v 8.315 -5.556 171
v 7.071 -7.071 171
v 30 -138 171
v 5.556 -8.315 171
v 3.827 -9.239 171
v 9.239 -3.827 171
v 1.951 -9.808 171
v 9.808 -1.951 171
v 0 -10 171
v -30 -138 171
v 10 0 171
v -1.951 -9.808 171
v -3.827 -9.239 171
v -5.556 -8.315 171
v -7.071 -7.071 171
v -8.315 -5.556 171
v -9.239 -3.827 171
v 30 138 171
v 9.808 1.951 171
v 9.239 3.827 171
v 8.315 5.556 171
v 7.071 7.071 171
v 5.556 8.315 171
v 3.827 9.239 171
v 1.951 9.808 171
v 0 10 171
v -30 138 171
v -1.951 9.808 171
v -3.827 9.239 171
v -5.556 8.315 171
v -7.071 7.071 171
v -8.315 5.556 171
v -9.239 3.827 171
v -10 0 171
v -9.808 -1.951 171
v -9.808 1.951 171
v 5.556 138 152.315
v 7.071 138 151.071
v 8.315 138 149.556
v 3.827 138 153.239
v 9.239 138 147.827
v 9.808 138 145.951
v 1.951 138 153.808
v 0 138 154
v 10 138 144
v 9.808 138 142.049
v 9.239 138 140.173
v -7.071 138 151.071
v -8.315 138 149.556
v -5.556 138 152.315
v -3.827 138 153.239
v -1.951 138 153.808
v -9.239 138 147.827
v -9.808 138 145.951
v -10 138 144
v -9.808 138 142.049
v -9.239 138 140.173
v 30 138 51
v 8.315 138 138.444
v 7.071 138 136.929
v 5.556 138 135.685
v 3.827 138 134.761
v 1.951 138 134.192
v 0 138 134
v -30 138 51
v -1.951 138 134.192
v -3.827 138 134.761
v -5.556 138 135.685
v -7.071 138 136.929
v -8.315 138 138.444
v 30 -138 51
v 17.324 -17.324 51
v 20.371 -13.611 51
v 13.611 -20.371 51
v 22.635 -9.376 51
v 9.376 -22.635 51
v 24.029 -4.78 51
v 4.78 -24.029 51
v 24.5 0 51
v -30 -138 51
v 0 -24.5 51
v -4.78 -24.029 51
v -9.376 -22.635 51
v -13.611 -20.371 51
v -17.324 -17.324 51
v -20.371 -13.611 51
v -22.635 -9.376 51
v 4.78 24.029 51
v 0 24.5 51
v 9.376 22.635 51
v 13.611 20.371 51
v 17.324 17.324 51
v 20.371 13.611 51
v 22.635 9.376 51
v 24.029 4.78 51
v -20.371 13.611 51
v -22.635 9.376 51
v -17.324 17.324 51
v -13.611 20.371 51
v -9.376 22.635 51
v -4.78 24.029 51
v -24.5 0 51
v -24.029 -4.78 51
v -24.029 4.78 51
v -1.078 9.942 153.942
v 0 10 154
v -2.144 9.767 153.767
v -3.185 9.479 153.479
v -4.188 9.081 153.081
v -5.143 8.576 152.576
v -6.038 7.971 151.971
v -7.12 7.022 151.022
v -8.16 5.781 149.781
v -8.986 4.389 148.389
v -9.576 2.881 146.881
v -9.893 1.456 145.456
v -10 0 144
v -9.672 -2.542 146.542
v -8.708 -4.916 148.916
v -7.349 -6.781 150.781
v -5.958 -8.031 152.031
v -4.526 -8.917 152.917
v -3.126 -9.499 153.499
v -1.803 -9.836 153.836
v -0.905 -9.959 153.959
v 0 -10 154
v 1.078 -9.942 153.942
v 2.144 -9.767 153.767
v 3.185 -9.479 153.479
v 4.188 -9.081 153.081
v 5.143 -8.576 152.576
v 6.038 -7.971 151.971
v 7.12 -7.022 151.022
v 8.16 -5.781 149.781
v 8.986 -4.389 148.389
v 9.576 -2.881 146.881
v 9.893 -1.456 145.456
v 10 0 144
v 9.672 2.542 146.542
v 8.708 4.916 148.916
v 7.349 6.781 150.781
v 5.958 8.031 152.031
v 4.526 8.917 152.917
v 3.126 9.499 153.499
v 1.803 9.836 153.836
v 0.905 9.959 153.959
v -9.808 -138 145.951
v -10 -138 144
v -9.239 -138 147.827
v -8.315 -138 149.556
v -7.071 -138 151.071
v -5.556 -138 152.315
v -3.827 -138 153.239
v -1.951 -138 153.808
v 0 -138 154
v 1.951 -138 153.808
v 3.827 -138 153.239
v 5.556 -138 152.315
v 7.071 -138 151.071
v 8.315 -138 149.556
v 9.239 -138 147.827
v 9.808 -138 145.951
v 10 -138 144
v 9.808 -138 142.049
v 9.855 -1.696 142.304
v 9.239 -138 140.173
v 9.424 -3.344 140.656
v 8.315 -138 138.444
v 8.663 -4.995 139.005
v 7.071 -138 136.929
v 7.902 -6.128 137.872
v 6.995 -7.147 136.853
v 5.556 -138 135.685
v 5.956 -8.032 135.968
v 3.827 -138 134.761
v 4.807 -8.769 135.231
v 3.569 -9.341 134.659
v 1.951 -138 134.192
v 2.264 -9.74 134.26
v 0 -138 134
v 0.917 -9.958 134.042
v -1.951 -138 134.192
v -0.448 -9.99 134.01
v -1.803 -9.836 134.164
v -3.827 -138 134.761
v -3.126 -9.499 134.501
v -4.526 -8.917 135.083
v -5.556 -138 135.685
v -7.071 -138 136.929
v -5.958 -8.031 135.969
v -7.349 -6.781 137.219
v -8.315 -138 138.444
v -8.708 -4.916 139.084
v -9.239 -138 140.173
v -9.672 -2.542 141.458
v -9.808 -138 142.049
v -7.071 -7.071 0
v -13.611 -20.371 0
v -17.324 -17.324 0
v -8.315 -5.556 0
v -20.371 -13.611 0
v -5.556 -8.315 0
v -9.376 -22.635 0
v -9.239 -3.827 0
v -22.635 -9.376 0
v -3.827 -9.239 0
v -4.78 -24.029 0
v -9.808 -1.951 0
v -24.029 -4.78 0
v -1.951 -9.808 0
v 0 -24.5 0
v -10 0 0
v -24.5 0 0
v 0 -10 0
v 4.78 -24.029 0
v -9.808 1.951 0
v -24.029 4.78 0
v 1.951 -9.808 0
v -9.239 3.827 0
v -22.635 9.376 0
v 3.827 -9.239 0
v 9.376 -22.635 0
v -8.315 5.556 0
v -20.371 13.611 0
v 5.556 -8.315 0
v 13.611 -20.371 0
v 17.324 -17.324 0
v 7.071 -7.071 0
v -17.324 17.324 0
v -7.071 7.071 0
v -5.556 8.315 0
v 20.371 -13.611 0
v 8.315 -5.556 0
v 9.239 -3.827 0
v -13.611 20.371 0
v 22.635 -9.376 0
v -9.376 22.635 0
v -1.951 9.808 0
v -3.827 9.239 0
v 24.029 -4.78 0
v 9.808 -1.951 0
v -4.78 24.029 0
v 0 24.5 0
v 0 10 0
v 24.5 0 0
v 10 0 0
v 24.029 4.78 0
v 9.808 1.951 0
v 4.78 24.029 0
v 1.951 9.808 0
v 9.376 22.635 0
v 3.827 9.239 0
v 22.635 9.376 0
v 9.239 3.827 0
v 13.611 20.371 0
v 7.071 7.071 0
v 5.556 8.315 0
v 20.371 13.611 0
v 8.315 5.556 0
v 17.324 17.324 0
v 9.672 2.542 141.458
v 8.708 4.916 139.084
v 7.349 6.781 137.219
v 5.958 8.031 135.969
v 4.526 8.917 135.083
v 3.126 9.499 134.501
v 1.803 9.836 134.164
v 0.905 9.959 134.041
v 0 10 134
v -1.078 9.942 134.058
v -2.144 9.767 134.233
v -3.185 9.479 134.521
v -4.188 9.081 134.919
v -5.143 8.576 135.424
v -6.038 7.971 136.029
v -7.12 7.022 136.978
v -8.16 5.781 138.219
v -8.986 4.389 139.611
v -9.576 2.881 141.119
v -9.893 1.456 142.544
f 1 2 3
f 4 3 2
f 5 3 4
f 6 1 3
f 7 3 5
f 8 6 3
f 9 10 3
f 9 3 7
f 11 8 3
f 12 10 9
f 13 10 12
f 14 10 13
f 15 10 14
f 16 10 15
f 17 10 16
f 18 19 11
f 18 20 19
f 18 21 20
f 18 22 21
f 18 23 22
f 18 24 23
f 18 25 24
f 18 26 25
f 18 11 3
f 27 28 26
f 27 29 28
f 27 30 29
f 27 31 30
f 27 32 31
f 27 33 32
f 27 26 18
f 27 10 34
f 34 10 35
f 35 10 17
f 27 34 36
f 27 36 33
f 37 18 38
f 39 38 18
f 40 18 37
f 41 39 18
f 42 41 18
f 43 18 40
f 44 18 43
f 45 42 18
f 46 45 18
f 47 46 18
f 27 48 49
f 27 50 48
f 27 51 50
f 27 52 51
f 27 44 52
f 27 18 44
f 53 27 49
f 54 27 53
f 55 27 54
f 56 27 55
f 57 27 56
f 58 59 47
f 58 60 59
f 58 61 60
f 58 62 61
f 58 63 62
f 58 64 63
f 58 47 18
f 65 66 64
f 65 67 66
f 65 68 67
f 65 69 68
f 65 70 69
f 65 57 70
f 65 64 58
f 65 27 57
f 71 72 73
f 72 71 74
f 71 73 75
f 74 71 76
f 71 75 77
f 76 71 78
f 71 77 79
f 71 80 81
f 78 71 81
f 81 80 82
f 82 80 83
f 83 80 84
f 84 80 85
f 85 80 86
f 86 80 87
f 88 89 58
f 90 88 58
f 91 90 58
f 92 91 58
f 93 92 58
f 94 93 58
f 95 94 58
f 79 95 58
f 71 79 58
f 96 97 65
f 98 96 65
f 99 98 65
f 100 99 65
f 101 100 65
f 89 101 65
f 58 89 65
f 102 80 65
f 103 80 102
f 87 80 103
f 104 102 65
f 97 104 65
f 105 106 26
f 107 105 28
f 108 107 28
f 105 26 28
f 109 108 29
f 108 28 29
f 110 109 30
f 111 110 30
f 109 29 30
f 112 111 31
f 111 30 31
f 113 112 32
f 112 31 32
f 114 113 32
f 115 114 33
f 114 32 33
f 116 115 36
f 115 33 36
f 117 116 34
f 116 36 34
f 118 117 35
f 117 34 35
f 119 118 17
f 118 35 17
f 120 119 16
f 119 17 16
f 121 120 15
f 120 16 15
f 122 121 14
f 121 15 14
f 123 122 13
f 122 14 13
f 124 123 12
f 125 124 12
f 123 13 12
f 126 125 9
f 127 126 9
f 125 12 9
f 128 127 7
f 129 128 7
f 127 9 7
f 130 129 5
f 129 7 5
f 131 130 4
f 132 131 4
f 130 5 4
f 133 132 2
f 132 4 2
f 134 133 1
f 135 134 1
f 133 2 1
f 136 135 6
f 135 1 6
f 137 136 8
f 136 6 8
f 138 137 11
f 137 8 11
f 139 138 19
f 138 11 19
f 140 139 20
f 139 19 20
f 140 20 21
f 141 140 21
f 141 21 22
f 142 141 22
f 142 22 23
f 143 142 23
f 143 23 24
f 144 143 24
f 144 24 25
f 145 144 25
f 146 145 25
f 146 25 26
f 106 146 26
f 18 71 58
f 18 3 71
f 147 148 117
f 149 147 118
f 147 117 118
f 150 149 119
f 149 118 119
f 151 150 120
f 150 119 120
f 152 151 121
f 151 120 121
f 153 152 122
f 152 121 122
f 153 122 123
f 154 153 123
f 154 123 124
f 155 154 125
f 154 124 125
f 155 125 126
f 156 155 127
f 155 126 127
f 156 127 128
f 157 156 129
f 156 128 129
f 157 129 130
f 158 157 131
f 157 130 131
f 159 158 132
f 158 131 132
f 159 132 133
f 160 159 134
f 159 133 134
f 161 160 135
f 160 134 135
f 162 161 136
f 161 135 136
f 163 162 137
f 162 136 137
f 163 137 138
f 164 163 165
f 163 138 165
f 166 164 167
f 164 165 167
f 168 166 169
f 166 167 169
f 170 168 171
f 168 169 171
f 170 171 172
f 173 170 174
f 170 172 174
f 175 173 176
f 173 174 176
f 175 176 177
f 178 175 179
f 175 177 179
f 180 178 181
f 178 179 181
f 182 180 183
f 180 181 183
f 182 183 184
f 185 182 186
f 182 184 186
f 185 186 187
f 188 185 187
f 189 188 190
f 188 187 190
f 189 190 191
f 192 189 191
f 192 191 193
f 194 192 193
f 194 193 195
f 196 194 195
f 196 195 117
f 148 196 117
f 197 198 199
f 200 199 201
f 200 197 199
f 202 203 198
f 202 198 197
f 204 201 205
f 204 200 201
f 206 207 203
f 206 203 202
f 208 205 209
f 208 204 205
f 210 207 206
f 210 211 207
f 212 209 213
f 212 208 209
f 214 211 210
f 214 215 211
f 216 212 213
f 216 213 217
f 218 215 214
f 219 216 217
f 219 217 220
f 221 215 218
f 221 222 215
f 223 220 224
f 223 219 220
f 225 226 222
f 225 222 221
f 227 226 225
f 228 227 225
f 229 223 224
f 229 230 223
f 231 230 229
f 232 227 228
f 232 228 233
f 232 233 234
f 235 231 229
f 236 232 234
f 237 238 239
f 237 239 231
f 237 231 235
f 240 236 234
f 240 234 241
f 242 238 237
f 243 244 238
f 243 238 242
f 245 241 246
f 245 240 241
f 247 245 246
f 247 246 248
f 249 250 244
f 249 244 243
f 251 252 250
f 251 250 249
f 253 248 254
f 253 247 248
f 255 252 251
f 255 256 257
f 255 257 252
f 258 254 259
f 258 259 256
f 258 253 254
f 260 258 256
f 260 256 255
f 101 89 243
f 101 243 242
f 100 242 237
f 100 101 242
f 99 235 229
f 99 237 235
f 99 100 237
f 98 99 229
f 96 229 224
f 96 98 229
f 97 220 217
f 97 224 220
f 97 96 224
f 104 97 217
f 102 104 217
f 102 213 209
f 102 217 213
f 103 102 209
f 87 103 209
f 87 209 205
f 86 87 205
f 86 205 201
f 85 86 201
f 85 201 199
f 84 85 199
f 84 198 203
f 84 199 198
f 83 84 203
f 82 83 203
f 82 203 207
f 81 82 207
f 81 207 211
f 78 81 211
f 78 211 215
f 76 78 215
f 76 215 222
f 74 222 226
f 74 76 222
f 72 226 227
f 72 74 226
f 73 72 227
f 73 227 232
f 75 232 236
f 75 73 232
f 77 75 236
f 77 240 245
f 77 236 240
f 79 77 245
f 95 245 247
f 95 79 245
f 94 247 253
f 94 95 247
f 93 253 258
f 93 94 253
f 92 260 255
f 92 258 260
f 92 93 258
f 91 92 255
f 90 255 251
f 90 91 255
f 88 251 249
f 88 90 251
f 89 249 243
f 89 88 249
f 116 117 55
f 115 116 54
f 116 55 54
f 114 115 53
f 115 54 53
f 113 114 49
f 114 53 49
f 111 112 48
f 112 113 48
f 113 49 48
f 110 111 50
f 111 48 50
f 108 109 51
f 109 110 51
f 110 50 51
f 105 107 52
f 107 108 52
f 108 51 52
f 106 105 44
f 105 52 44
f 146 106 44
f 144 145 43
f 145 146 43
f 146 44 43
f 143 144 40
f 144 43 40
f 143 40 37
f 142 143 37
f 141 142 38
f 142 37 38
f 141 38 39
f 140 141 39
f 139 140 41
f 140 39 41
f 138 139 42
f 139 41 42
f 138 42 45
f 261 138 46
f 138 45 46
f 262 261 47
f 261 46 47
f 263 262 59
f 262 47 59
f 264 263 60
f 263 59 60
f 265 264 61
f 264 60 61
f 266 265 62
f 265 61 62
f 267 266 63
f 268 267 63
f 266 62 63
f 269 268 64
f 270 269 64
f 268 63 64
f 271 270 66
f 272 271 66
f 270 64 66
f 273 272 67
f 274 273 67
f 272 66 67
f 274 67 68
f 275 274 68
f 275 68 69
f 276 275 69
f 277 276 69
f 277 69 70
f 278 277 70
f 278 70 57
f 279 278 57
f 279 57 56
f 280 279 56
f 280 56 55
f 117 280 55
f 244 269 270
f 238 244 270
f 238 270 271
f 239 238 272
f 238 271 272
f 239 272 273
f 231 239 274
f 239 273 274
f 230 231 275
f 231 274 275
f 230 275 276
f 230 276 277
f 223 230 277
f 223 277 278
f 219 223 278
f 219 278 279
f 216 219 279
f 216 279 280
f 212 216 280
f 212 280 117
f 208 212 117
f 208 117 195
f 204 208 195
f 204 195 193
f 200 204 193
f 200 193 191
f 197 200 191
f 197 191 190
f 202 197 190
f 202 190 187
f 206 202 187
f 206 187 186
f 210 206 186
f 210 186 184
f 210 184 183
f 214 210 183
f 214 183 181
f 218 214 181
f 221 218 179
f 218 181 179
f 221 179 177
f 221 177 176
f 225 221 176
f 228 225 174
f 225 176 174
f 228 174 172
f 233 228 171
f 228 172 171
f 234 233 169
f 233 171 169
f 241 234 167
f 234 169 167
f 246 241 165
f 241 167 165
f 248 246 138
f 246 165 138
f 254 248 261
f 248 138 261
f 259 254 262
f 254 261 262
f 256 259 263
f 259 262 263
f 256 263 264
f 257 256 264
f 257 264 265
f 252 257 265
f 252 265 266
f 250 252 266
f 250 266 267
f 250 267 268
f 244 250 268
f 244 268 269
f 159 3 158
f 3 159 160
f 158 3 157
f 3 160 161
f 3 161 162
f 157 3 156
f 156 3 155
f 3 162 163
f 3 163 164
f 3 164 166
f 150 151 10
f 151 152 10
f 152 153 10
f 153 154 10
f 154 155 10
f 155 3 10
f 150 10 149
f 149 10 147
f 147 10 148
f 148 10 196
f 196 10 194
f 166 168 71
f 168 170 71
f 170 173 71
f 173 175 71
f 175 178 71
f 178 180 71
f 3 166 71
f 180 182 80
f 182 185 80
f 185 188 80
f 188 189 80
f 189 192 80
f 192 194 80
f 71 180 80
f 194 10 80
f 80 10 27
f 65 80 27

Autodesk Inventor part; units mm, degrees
ref_plane "YZ Plane" through (0, 0, 0) normal (1, 0, 0) x (0, 1, 0)
ref_plane "XZ Plane" through (0, 0, 0) normal (0, 1, 0) x (-1, 0, 0)
ref_plane "XY Plane" through (0, 0, 0) normal (0, 0, 1) x (1, 0, 0)
sketch "Sketch1" plane through (0, 0, 0) normal (0, 0, 1) x (1, 0, 0)
  line L0 (0, 27) -> (138, 27)
  line L1 (138, 27) -> (138, 0)
  line L2 (138, 0) -> (138, -27)
  line L3 (138, -27) -> (27, -93) construction
  line L4 (27, -93) -> (0, -93)
  line L5 (0, -93) -> (0, 27) construction
  line L6 (0, 0) -> (138, 0) construction
  line L7 (0, 27) -> (-138, 27)
  line L8 (-138, 27) -> (-138, 0)
  line L9 (-138, 0) -> (-138, -27)
  line L10 (-138, -27) -> (-27, -93) construction
  line L11 (-27, -93) -> (0, -93)
  line L12 (27, -93) -> (138, -93)
  line L13 (138, -93) -> (138, -27)
  line L14 (-27, -93) -> (-138, -93)
  line L15 (-138, -93) -> (-138, -27)
  dimension "d0" = 138
  dimension "d2" = 27
  dimension "d3" = 54
  dimension "d4" = 27
  dimension "d5" = 120
extrude "Extrusion1" add sketch "Sketch1" along normal mid plane 60
sketch "Sketch2" plane through (-27, -93, 30) normal (0, -1, 0) x (1, 0, 0)
  circle A0 centre (27, -30) radius 24.5
  dimension "d20" = 49
extrude "Extrusion2" add sketch "Sketch2" along normal blind 51
sketch "Sketch3" plane through (-138, 27, 30) normal (0, 1, 0) x (1, 0, 0)
  circle A0 centre (138, 30) radius 10
  dimension "d12" = 20
extrude "Extrusion3" cut sketch "Sketch3" against normal through all
sketch "Sketch4" plane through (138, -27, 30) normal (1, 0, 0) x (0, 0, -1)
  circle A0 centre (30, 27) radius 10
  dimension "d16" = 20
extrude "Extrusion4" cut sketch "Sketch4" against normal through all
move or copy body "Move Body1" bodies to move or copy 1 copy no rotation origin (0, 0, 0) rotation axis (1, 0, 0) rotation angle 90
move or copy body "Move Body2" bodies to move or copy 1 copy no rotation origin (0, 0, 0) rotation axis (0, 0, 1) rotation angle 90
move or copy body "Move Body4" bodies to move or copy 1 copy no translate (0, 0, 144)
properties part number "UpperTorso_v2"
